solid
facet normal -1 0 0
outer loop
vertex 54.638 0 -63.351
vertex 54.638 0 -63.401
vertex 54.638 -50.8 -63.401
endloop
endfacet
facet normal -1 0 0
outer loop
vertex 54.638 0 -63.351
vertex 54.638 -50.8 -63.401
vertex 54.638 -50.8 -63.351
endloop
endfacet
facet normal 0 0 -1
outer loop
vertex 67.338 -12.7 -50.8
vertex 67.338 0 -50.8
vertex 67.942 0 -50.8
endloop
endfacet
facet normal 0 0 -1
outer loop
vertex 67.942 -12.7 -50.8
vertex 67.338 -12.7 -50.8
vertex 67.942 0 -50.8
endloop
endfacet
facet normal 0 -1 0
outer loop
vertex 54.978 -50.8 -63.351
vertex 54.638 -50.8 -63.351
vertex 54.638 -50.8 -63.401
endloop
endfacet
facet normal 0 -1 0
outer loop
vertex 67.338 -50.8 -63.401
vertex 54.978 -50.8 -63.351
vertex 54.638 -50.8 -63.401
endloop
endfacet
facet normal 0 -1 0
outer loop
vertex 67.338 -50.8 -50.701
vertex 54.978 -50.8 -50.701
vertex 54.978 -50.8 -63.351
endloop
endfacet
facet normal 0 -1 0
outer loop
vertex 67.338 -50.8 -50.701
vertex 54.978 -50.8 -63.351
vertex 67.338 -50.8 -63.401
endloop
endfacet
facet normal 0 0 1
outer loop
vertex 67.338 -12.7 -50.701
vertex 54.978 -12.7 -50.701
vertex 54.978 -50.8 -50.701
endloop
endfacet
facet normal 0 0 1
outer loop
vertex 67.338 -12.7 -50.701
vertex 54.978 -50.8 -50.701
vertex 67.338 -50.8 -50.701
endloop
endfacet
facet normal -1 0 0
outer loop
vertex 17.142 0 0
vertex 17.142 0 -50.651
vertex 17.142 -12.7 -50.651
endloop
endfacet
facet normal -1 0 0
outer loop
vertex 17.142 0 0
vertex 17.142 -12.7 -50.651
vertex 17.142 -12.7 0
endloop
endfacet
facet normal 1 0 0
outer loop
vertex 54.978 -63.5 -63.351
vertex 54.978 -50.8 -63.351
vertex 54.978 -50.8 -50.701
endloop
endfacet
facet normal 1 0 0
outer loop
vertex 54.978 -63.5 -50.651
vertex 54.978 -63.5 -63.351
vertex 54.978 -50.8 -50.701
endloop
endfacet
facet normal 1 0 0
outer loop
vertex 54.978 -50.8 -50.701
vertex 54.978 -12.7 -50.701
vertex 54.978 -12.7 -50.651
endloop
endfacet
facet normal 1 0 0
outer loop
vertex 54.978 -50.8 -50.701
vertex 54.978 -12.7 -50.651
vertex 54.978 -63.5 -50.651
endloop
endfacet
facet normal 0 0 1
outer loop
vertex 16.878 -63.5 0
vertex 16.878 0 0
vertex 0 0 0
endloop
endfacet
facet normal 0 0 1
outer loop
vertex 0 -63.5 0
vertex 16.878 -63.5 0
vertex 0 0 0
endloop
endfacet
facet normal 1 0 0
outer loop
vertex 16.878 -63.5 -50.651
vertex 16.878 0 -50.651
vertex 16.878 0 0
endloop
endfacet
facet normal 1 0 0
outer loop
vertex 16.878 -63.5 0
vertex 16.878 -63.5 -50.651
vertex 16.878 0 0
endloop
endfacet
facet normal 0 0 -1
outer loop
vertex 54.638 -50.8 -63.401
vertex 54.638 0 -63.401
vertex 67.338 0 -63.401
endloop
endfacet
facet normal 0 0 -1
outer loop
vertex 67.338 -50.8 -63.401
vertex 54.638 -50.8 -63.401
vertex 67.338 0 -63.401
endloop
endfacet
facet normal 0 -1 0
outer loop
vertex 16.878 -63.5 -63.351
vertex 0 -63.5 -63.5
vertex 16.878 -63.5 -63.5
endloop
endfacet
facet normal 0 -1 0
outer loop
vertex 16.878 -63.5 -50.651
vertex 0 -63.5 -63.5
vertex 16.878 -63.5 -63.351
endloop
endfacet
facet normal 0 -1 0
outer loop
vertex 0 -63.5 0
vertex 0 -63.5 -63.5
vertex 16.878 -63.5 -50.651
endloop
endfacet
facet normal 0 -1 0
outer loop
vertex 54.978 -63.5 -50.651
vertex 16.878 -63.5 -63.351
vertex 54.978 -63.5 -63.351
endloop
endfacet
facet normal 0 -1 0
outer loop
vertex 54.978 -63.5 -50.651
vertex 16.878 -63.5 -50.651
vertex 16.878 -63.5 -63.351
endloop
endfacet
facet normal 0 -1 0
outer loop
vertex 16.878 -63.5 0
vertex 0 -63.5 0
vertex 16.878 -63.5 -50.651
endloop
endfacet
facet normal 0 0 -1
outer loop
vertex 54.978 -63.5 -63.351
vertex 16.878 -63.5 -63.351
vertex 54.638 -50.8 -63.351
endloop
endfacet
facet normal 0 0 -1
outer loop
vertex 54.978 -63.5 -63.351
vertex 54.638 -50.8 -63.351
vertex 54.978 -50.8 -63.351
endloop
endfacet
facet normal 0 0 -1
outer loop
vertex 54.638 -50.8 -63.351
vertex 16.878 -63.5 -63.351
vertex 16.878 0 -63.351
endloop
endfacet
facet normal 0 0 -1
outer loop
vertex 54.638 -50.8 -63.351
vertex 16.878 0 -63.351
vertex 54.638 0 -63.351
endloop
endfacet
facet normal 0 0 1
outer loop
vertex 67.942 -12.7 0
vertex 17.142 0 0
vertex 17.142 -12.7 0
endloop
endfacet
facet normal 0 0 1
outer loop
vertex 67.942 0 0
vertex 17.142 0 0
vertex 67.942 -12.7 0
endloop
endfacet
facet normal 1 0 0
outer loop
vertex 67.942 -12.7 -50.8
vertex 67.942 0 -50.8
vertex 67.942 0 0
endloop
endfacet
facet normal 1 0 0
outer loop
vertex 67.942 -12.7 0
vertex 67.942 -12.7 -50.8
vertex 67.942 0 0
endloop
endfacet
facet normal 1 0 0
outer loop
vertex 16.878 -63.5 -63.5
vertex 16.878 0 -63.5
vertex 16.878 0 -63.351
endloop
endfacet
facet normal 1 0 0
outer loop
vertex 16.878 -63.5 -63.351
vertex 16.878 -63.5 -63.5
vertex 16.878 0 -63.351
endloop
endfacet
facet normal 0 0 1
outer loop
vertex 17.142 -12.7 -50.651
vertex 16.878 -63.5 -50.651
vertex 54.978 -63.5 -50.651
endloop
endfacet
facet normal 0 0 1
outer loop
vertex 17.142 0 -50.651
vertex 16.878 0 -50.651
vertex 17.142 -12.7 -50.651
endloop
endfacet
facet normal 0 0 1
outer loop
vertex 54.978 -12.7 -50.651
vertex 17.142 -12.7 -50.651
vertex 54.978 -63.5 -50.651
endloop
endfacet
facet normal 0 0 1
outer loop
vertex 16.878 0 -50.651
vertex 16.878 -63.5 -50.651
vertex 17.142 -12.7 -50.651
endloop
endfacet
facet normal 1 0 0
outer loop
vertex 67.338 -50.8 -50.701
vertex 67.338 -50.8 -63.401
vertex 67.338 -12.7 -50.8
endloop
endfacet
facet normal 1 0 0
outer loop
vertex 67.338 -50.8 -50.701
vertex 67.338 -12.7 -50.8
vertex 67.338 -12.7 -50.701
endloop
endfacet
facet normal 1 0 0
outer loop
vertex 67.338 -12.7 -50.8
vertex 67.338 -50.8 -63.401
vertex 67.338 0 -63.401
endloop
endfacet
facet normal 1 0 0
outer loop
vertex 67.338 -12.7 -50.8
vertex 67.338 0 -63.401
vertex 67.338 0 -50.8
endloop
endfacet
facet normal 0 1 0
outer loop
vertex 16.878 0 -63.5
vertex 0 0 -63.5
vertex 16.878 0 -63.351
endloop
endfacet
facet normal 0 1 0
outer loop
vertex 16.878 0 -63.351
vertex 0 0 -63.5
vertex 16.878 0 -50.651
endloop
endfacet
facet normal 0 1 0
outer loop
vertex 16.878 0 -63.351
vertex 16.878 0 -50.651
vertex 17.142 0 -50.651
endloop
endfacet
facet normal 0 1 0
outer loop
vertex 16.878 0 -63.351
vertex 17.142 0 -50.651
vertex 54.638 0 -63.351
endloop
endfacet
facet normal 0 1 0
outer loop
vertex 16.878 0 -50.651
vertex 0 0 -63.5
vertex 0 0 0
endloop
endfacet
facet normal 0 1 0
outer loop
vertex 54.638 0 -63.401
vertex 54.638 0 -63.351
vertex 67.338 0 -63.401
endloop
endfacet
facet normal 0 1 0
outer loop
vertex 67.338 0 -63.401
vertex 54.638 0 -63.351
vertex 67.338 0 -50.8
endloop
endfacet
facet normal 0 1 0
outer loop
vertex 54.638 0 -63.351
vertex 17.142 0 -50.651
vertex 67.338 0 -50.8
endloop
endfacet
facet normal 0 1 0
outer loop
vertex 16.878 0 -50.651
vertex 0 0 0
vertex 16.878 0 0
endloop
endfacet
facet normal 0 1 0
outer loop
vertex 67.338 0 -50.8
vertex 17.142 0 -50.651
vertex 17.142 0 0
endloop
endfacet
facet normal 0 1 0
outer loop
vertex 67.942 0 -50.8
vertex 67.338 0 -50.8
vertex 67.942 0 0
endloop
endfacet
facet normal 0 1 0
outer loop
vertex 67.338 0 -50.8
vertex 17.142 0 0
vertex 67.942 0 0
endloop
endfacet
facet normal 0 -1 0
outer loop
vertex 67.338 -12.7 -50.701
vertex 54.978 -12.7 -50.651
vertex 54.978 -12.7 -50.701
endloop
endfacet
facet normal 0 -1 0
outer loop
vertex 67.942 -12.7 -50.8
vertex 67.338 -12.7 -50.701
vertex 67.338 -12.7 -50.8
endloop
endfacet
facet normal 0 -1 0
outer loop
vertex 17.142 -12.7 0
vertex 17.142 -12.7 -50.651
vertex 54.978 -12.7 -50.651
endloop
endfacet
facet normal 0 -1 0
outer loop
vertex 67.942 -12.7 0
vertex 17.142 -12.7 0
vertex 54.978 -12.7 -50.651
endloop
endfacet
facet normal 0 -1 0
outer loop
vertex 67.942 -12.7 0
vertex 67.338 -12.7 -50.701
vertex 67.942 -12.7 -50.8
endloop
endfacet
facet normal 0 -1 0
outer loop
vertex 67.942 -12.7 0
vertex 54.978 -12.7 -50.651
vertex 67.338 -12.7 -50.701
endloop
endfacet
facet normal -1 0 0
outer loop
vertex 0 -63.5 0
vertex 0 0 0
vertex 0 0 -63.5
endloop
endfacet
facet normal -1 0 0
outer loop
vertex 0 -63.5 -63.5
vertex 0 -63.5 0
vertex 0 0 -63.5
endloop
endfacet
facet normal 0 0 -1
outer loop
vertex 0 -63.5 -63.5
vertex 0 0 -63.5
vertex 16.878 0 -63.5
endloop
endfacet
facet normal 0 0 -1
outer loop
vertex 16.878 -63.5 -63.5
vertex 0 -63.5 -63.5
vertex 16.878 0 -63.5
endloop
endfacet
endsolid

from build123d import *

# Parameters (mm, degrees)
F0_W     = 38.1
F0_H     = 12.7
F1_DEPTH = 63.5
F2_W     = 10.787756
F2_H     = 12.239977
F3_DEPTH = 25.4
F5_W     = 12.7
F5_H     = 12.7
F6_DEPTH = 50.8
F7_W     = 50.8
F7_H     = 50.8
F8_DEPTH = 12.7


with BuildPart() as f1:
    # F0 (on Front) → F1 (new body)
    with BuildSketch(Plane.XZ):
        Polygon((16.877607, 0), (0, 0), (0, -63.5), (16.877607, -63.5), (16.877607, -63.351139), (16.877607, -50.651139), align=None)
        with Locations((35.927607, -57.001139)):
            Rectangle(F0_W, F0_H)
    extrude(amount=F1_DEPTH)

    # F5 (on Front) → F6 (join)
    with BuildSketch(Plane.XZ):
        with Locations((60.988158, -57.050698)):
            Rectangle(F5_W, F5_H)
    extrude(amount=F6_DEPTH)

    # F7 (on Front) → F8 (join)
    with BuildSketch(Plane.XZ):
        with Locations((42.542354, -25.4)):
            Rectangle(F7_W, F7_H)
    extrude(amount=F8_DEPTH)


with BuildPart() as f3:
    # F2 (on Front) → F3 (new body)
    with BuildSketch(Plane.XZ):
        with Locations((60.992375, -56.739516)):
            Rectangle(F2_W, F2_H)
    extrude(amount=F3_DEPTH)


solid = f1.part
